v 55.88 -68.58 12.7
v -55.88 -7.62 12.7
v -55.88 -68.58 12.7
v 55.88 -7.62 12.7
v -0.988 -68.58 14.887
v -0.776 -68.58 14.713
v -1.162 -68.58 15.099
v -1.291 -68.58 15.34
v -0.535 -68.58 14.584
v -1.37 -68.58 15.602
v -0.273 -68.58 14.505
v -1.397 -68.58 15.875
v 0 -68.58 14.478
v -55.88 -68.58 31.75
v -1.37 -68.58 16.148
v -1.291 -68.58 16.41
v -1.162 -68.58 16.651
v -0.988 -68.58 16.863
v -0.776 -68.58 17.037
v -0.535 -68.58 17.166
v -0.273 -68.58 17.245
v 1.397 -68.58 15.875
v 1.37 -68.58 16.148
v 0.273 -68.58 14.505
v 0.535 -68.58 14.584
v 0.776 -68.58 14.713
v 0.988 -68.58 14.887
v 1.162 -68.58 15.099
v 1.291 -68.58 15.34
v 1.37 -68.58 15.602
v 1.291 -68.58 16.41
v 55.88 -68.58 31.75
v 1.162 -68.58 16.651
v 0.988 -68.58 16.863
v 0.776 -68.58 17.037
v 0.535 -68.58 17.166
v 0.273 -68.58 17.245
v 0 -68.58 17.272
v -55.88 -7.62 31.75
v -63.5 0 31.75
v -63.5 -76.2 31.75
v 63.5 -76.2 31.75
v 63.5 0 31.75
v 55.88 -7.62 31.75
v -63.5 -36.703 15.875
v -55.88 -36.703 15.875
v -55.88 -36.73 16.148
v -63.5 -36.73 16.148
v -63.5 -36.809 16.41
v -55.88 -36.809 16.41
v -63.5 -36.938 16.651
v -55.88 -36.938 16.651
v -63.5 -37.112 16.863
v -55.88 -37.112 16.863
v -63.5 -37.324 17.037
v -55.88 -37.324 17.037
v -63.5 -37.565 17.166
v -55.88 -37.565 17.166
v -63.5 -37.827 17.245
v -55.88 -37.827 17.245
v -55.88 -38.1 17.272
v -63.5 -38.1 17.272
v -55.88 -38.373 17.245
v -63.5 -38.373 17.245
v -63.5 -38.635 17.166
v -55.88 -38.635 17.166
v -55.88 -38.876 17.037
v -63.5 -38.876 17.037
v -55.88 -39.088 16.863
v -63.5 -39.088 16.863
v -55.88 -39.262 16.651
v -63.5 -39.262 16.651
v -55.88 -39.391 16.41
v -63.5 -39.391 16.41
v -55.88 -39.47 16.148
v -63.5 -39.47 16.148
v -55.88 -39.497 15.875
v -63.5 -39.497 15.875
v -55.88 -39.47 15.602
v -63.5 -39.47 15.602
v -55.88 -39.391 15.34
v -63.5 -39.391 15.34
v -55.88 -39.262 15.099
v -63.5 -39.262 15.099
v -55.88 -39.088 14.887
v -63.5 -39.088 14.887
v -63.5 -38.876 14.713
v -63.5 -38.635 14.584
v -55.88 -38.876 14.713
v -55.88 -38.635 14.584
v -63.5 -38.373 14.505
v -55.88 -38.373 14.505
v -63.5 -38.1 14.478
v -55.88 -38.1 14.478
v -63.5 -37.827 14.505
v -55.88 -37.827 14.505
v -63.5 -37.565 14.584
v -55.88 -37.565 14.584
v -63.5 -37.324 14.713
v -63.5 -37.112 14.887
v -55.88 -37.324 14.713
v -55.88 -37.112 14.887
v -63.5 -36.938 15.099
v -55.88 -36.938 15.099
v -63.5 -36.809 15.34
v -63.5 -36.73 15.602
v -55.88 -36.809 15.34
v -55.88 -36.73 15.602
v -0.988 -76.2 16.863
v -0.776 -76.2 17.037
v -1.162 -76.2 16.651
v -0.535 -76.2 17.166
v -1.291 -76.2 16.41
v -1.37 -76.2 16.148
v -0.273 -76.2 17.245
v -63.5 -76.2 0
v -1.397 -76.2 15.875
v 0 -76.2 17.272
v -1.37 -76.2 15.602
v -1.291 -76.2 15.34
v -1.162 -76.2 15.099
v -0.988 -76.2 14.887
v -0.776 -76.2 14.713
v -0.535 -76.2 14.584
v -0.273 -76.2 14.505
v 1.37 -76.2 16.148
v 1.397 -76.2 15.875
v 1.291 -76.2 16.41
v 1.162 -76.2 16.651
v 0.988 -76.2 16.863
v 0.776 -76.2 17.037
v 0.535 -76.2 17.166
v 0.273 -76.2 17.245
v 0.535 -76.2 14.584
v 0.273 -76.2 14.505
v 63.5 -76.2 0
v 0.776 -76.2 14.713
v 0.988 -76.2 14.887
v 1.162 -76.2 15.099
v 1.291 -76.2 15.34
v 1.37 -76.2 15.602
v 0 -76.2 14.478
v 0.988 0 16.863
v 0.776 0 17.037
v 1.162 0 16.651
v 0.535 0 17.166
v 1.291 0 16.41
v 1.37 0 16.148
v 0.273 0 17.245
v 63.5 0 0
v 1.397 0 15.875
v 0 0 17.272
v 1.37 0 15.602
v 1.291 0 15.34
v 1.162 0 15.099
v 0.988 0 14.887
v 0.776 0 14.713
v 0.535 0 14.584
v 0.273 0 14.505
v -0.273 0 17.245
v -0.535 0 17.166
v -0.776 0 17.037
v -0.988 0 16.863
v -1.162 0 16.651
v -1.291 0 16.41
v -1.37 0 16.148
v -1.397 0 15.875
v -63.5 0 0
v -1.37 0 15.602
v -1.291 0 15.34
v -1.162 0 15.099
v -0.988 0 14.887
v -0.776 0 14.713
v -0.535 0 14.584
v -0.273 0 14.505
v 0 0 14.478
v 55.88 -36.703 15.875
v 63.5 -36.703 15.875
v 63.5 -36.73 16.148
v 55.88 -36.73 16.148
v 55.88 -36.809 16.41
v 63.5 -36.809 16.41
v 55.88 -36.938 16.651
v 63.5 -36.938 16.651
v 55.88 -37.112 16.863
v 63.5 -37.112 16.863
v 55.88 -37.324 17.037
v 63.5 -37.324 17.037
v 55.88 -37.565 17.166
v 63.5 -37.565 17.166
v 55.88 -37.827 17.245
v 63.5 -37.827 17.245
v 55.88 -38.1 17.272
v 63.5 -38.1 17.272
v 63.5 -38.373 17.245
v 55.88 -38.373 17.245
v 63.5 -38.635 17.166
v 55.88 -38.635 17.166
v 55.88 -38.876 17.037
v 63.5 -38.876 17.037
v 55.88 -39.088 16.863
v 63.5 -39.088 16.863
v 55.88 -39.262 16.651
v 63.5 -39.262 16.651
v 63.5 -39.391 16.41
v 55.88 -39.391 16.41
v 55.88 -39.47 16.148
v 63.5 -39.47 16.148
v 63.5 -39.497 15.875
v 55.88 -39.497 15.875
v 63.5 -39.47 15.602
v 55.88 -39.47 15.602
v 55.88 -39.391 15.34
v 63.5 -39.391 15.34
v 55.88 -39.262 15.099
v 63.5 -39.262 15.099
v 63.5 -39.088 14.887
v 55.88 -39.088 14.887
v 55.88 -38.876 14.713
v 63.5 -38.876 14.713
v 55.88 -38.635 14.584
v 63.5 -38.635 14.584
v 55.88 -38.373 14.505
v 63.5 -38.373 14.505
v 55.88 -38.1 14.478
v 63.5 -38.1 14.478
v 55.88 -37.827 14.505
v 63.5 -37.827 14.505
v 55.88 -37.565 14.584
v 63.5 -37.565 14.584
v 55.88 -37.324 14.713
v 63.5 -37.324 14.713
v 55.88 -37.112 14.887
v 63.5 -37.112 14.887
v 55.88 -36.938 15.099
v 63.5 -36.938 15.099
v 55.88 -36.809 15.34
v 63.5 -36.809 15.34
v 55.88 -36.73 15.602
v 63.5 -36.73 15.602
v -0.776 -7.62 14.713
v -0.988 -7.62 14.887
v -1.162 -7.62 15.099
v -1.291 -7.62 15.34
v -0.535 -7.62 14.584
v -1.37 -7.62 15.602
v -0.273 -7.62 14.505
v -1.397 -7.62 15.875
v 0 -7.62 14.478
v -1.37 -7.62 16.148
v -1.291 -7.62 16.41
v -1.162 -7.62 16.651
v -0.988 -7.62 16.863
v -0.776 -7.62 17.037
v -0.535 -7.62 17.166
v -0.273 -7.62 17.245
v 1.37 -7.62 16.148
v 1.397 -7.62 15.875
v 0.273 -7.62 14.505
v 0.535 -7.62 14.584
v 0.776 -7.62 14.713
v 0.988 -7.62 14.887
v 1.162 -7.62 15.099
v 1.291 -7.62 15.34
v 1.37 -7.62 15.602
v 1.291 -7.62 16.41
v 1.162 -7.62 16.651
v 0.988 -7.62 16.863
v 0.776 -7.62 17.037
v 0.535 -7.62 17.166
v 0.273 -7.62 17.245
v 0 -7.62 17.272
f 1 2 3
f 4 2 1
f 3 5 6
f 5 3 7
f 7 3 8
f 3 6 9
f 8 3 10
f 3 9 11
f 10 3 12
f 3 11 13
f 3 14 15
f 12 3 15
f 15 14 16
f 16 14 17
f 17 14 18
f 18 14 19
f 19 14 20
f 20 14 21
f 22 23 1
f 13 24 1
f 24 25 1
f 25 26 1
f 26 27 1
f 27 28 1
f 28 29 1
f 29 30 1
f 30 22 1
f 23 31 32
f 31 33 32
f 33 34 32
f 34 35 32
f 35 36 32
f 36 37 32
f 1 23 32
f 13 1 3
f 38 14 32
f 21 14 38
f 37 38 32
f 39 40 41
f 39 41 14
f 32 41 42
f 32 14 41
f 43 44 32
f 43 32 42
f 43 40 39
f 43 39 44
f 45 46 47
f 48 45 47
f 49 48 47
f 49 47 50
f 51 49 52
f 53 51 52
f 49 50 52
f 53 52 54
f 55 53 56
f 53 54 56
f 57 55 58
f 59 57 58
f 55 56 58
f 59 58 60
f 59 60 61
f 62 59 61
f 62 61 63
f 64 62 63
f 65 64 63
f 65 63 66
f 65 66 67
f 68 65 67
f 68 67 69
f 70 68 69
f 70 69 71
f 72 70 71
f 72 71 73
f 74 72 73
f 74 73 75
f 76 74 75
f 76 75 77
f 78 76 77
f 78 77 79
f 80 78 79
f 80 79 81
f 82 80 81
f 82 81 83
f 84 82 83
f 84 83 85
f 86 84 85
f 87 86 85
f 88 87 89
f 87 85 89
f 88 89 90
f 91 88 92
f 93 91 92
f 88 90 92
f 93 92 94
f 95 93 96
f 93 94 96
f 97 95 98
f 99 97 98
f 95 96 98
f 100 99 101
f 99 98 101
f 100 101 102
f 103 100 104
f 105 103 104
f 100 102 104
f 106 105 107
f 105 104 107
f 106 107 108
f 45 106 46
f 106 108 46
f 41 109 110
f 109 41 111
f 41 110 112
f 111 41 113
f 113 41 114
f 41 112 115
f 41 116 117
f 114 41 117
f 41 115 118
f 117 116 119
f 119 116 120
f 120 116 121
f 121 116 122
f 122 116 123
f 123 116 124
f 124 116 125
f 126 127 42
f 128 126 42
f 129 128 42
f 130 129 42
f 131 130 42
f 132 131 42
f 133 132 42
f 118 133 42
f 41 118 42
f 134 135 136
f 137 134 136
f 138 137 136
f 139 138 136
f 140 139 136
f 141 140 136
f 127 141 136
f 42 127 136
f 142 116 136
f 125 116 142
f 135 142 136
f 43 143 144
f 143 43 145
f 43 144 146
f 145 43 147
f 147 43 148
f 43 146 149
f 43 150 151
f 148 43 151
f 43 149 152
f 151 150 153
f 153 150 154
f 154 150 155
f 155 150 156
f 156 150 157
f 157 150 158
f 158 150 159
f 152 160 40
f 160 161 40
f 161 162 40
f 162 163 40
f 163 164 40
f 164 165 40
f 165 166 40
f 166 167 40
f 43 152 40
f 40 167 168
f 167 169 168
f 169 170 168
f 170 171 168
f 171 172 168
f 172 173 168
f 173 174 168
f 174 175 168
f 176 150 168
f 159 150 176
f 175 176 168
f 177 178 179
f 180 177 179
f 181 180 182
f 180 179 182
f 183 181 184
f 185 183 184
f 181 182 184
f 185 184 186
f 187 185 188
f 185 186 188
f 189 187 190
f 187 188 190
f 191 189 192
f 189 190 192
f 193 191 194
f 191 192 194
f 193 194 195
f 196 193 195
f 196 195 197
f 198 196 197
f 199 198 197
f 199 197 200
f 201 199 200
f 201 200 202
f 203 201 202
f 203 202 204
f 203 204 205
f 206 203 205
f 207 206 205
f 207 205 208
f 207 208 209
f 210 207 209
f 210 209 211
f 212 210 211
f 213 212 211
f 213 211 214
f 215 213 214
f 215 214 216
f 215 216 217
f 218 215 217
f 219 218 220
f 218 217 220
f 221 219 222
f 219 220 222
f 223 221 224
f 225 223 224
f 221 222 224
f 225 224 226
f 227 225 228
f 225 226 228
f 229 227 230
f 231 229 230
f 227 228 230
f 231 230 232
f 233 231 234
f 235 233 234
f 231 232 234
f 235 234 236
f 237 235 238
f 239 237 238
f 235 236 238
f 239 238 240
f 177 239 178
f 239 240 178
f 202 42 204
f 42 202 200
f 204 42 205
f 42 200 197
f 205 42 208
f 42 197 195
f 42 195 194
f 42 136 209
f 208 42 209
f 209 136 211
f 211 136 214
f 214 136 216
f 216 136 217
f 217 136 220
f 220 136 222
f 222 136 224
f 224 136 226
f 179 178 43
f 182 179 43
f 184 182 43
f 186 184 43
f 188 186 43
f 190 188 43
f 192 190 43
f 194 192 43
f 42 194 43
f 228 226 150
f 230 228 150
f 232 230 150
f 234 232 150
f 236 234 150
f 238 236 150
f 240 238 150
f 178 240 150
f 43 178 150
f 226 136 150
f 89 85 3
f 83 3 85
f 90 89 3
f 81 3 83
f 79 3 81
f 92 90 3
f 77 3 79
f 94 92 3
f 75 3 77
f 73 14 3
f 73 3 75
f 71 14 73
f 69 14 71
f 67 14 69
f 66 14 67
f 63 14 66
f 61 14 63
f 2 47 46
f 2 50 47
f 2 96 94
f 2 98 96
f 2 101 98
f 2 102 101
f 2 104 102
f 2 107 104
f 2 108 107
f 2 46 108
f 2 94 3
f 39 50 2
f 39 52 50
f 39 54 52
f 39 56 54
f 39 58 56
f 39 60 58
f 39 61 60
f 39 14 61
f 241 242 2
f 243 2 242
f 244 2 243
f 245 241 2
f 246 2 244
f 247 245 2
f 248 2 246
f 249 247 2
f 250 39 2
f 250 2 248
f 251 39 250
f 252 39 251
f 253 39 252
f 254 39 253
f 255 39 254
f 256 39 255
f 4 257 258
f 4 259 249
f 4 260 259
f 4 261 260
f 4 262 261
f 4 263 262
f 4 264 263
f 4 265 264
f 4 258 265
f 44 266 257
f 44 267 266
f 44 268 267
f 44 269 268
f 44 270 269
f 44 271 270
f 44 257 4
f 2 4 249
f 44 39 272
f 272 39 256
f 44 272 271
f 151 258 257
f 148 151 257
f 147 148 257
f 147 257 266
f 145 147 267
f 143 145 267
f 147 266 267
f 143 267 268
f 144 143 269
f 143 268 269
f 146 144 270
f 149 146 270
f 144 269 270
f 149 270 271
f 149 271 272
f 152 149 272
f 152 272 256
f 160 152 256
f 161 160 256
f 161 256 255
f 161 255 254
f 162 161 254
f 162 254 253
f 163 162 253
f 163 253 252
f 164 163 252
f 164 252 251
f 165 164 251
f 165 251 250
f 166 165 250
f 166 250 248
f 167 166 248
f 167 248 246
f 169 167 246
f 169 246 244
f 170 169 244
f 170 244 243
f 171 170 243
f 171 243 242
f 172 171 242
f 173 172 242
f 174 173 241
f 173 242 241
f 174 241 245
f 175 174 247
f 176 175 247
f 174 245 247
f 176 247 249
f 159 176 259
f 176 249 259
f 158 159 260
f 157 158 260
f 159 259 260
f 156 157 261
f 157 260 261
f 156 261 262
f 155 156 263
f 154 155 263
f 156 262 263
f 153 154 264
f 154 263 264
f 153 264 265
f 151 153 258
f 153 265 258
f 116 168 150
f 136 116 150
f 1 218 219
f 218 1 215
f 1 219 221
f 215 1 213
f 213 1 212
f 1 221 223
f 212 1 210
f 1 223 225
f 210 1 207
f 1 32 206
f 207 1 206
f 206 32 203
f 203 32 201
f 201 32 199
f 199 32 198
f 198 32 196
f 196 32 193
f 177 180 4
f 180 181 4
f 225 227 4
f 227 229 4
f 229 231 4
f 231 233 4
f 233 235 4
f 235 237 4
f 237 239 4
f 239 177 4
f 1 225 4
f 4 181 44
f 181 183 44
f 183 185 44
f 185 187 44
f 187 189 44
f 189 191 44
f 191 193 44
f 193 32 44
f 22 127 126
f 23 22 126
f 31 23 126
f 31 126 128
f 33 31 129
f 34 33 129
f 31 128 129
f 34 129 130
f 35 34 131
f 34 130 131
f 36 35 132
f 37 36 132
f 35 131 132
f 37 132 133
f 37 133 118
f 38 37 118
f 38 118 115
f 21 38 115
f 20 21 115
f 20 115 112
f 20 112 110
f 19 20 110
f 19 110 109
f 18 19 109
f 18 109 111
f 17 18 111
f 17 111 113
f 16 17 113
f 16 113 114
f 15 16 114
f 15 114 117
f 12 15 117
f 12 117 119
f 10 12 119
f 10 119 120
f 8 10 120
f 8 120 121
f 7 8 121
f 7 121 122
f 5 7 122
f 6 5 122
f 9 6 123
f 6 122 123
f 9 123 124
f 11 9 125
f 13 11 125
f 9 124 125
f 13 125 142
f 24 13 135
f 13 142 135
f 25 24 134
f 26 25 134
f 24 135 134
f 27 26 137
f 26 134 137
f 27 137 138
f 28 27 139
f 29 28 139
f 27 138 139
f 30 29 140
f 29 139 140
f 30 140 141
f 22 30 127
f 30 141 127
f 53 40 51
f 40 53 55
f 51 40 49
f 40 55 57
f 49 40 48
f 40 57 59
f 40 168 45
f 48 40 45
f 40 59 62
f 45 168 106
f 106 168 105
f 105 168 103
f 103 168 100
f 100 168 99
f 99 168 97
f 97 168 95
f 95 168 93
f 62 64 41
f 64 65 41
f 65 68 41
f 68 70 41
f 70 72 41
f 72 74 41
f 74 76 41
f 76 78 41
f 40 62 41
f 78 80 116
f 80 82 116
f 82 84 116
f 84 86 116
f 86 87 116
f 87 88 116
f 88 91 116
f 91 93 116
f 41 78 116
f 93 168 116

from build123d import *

# Parameters (mm, degrees)
F1_DEPTH = 31.75
F2_W     = 111.76
F2_H     = 60.96
F3_DEPTH = 19.05
F4_R     = 1.397
F5_DEPTH = 127.001
F6_R     = 1.397
F7_DEPTH = 76.201


with BuildPart() as f1:
    # F0 (on Top) → F1 (new body)
    with BuildSketch(Plane.XY):
        Polygon((63.5, 0), (0, 0), (-63.5, 0), (-63.5, -76.2), (63.5, -76.2), align=None)
    extrude(amount=F1_DEPTH)

    # F2 (on face) → F3 (cut)
    with BuildSketch(Plane.XY.offset(31.75)):
        with Locations((0, -38.1)):
            Rectangle(F2_W, F2_H)
    extrude(amount=-F3_DEPTH, mode=Mode.SUBTRACT)

    # F4 (on face) → F5 (cut, through all)
    with BuildSketch(Plane.YZ.offset(63.5)):
        with Locations((-38.1, 15.875)):
            Circle(F4_R)
    extrude(amount=-F5_DEPTH, mode=Mode.SUBTRACT)

    # F6 (on face) → F7 (cut, through all)
    with BuildSketch(Plane.XZ.offset(76.2)):
        with Locations((0, 15.875)):
            Circle(F6_R)
    extrude(amount=-F7_DEPTH, mode=Mode.SUBTRACT)


solid = f1.part
